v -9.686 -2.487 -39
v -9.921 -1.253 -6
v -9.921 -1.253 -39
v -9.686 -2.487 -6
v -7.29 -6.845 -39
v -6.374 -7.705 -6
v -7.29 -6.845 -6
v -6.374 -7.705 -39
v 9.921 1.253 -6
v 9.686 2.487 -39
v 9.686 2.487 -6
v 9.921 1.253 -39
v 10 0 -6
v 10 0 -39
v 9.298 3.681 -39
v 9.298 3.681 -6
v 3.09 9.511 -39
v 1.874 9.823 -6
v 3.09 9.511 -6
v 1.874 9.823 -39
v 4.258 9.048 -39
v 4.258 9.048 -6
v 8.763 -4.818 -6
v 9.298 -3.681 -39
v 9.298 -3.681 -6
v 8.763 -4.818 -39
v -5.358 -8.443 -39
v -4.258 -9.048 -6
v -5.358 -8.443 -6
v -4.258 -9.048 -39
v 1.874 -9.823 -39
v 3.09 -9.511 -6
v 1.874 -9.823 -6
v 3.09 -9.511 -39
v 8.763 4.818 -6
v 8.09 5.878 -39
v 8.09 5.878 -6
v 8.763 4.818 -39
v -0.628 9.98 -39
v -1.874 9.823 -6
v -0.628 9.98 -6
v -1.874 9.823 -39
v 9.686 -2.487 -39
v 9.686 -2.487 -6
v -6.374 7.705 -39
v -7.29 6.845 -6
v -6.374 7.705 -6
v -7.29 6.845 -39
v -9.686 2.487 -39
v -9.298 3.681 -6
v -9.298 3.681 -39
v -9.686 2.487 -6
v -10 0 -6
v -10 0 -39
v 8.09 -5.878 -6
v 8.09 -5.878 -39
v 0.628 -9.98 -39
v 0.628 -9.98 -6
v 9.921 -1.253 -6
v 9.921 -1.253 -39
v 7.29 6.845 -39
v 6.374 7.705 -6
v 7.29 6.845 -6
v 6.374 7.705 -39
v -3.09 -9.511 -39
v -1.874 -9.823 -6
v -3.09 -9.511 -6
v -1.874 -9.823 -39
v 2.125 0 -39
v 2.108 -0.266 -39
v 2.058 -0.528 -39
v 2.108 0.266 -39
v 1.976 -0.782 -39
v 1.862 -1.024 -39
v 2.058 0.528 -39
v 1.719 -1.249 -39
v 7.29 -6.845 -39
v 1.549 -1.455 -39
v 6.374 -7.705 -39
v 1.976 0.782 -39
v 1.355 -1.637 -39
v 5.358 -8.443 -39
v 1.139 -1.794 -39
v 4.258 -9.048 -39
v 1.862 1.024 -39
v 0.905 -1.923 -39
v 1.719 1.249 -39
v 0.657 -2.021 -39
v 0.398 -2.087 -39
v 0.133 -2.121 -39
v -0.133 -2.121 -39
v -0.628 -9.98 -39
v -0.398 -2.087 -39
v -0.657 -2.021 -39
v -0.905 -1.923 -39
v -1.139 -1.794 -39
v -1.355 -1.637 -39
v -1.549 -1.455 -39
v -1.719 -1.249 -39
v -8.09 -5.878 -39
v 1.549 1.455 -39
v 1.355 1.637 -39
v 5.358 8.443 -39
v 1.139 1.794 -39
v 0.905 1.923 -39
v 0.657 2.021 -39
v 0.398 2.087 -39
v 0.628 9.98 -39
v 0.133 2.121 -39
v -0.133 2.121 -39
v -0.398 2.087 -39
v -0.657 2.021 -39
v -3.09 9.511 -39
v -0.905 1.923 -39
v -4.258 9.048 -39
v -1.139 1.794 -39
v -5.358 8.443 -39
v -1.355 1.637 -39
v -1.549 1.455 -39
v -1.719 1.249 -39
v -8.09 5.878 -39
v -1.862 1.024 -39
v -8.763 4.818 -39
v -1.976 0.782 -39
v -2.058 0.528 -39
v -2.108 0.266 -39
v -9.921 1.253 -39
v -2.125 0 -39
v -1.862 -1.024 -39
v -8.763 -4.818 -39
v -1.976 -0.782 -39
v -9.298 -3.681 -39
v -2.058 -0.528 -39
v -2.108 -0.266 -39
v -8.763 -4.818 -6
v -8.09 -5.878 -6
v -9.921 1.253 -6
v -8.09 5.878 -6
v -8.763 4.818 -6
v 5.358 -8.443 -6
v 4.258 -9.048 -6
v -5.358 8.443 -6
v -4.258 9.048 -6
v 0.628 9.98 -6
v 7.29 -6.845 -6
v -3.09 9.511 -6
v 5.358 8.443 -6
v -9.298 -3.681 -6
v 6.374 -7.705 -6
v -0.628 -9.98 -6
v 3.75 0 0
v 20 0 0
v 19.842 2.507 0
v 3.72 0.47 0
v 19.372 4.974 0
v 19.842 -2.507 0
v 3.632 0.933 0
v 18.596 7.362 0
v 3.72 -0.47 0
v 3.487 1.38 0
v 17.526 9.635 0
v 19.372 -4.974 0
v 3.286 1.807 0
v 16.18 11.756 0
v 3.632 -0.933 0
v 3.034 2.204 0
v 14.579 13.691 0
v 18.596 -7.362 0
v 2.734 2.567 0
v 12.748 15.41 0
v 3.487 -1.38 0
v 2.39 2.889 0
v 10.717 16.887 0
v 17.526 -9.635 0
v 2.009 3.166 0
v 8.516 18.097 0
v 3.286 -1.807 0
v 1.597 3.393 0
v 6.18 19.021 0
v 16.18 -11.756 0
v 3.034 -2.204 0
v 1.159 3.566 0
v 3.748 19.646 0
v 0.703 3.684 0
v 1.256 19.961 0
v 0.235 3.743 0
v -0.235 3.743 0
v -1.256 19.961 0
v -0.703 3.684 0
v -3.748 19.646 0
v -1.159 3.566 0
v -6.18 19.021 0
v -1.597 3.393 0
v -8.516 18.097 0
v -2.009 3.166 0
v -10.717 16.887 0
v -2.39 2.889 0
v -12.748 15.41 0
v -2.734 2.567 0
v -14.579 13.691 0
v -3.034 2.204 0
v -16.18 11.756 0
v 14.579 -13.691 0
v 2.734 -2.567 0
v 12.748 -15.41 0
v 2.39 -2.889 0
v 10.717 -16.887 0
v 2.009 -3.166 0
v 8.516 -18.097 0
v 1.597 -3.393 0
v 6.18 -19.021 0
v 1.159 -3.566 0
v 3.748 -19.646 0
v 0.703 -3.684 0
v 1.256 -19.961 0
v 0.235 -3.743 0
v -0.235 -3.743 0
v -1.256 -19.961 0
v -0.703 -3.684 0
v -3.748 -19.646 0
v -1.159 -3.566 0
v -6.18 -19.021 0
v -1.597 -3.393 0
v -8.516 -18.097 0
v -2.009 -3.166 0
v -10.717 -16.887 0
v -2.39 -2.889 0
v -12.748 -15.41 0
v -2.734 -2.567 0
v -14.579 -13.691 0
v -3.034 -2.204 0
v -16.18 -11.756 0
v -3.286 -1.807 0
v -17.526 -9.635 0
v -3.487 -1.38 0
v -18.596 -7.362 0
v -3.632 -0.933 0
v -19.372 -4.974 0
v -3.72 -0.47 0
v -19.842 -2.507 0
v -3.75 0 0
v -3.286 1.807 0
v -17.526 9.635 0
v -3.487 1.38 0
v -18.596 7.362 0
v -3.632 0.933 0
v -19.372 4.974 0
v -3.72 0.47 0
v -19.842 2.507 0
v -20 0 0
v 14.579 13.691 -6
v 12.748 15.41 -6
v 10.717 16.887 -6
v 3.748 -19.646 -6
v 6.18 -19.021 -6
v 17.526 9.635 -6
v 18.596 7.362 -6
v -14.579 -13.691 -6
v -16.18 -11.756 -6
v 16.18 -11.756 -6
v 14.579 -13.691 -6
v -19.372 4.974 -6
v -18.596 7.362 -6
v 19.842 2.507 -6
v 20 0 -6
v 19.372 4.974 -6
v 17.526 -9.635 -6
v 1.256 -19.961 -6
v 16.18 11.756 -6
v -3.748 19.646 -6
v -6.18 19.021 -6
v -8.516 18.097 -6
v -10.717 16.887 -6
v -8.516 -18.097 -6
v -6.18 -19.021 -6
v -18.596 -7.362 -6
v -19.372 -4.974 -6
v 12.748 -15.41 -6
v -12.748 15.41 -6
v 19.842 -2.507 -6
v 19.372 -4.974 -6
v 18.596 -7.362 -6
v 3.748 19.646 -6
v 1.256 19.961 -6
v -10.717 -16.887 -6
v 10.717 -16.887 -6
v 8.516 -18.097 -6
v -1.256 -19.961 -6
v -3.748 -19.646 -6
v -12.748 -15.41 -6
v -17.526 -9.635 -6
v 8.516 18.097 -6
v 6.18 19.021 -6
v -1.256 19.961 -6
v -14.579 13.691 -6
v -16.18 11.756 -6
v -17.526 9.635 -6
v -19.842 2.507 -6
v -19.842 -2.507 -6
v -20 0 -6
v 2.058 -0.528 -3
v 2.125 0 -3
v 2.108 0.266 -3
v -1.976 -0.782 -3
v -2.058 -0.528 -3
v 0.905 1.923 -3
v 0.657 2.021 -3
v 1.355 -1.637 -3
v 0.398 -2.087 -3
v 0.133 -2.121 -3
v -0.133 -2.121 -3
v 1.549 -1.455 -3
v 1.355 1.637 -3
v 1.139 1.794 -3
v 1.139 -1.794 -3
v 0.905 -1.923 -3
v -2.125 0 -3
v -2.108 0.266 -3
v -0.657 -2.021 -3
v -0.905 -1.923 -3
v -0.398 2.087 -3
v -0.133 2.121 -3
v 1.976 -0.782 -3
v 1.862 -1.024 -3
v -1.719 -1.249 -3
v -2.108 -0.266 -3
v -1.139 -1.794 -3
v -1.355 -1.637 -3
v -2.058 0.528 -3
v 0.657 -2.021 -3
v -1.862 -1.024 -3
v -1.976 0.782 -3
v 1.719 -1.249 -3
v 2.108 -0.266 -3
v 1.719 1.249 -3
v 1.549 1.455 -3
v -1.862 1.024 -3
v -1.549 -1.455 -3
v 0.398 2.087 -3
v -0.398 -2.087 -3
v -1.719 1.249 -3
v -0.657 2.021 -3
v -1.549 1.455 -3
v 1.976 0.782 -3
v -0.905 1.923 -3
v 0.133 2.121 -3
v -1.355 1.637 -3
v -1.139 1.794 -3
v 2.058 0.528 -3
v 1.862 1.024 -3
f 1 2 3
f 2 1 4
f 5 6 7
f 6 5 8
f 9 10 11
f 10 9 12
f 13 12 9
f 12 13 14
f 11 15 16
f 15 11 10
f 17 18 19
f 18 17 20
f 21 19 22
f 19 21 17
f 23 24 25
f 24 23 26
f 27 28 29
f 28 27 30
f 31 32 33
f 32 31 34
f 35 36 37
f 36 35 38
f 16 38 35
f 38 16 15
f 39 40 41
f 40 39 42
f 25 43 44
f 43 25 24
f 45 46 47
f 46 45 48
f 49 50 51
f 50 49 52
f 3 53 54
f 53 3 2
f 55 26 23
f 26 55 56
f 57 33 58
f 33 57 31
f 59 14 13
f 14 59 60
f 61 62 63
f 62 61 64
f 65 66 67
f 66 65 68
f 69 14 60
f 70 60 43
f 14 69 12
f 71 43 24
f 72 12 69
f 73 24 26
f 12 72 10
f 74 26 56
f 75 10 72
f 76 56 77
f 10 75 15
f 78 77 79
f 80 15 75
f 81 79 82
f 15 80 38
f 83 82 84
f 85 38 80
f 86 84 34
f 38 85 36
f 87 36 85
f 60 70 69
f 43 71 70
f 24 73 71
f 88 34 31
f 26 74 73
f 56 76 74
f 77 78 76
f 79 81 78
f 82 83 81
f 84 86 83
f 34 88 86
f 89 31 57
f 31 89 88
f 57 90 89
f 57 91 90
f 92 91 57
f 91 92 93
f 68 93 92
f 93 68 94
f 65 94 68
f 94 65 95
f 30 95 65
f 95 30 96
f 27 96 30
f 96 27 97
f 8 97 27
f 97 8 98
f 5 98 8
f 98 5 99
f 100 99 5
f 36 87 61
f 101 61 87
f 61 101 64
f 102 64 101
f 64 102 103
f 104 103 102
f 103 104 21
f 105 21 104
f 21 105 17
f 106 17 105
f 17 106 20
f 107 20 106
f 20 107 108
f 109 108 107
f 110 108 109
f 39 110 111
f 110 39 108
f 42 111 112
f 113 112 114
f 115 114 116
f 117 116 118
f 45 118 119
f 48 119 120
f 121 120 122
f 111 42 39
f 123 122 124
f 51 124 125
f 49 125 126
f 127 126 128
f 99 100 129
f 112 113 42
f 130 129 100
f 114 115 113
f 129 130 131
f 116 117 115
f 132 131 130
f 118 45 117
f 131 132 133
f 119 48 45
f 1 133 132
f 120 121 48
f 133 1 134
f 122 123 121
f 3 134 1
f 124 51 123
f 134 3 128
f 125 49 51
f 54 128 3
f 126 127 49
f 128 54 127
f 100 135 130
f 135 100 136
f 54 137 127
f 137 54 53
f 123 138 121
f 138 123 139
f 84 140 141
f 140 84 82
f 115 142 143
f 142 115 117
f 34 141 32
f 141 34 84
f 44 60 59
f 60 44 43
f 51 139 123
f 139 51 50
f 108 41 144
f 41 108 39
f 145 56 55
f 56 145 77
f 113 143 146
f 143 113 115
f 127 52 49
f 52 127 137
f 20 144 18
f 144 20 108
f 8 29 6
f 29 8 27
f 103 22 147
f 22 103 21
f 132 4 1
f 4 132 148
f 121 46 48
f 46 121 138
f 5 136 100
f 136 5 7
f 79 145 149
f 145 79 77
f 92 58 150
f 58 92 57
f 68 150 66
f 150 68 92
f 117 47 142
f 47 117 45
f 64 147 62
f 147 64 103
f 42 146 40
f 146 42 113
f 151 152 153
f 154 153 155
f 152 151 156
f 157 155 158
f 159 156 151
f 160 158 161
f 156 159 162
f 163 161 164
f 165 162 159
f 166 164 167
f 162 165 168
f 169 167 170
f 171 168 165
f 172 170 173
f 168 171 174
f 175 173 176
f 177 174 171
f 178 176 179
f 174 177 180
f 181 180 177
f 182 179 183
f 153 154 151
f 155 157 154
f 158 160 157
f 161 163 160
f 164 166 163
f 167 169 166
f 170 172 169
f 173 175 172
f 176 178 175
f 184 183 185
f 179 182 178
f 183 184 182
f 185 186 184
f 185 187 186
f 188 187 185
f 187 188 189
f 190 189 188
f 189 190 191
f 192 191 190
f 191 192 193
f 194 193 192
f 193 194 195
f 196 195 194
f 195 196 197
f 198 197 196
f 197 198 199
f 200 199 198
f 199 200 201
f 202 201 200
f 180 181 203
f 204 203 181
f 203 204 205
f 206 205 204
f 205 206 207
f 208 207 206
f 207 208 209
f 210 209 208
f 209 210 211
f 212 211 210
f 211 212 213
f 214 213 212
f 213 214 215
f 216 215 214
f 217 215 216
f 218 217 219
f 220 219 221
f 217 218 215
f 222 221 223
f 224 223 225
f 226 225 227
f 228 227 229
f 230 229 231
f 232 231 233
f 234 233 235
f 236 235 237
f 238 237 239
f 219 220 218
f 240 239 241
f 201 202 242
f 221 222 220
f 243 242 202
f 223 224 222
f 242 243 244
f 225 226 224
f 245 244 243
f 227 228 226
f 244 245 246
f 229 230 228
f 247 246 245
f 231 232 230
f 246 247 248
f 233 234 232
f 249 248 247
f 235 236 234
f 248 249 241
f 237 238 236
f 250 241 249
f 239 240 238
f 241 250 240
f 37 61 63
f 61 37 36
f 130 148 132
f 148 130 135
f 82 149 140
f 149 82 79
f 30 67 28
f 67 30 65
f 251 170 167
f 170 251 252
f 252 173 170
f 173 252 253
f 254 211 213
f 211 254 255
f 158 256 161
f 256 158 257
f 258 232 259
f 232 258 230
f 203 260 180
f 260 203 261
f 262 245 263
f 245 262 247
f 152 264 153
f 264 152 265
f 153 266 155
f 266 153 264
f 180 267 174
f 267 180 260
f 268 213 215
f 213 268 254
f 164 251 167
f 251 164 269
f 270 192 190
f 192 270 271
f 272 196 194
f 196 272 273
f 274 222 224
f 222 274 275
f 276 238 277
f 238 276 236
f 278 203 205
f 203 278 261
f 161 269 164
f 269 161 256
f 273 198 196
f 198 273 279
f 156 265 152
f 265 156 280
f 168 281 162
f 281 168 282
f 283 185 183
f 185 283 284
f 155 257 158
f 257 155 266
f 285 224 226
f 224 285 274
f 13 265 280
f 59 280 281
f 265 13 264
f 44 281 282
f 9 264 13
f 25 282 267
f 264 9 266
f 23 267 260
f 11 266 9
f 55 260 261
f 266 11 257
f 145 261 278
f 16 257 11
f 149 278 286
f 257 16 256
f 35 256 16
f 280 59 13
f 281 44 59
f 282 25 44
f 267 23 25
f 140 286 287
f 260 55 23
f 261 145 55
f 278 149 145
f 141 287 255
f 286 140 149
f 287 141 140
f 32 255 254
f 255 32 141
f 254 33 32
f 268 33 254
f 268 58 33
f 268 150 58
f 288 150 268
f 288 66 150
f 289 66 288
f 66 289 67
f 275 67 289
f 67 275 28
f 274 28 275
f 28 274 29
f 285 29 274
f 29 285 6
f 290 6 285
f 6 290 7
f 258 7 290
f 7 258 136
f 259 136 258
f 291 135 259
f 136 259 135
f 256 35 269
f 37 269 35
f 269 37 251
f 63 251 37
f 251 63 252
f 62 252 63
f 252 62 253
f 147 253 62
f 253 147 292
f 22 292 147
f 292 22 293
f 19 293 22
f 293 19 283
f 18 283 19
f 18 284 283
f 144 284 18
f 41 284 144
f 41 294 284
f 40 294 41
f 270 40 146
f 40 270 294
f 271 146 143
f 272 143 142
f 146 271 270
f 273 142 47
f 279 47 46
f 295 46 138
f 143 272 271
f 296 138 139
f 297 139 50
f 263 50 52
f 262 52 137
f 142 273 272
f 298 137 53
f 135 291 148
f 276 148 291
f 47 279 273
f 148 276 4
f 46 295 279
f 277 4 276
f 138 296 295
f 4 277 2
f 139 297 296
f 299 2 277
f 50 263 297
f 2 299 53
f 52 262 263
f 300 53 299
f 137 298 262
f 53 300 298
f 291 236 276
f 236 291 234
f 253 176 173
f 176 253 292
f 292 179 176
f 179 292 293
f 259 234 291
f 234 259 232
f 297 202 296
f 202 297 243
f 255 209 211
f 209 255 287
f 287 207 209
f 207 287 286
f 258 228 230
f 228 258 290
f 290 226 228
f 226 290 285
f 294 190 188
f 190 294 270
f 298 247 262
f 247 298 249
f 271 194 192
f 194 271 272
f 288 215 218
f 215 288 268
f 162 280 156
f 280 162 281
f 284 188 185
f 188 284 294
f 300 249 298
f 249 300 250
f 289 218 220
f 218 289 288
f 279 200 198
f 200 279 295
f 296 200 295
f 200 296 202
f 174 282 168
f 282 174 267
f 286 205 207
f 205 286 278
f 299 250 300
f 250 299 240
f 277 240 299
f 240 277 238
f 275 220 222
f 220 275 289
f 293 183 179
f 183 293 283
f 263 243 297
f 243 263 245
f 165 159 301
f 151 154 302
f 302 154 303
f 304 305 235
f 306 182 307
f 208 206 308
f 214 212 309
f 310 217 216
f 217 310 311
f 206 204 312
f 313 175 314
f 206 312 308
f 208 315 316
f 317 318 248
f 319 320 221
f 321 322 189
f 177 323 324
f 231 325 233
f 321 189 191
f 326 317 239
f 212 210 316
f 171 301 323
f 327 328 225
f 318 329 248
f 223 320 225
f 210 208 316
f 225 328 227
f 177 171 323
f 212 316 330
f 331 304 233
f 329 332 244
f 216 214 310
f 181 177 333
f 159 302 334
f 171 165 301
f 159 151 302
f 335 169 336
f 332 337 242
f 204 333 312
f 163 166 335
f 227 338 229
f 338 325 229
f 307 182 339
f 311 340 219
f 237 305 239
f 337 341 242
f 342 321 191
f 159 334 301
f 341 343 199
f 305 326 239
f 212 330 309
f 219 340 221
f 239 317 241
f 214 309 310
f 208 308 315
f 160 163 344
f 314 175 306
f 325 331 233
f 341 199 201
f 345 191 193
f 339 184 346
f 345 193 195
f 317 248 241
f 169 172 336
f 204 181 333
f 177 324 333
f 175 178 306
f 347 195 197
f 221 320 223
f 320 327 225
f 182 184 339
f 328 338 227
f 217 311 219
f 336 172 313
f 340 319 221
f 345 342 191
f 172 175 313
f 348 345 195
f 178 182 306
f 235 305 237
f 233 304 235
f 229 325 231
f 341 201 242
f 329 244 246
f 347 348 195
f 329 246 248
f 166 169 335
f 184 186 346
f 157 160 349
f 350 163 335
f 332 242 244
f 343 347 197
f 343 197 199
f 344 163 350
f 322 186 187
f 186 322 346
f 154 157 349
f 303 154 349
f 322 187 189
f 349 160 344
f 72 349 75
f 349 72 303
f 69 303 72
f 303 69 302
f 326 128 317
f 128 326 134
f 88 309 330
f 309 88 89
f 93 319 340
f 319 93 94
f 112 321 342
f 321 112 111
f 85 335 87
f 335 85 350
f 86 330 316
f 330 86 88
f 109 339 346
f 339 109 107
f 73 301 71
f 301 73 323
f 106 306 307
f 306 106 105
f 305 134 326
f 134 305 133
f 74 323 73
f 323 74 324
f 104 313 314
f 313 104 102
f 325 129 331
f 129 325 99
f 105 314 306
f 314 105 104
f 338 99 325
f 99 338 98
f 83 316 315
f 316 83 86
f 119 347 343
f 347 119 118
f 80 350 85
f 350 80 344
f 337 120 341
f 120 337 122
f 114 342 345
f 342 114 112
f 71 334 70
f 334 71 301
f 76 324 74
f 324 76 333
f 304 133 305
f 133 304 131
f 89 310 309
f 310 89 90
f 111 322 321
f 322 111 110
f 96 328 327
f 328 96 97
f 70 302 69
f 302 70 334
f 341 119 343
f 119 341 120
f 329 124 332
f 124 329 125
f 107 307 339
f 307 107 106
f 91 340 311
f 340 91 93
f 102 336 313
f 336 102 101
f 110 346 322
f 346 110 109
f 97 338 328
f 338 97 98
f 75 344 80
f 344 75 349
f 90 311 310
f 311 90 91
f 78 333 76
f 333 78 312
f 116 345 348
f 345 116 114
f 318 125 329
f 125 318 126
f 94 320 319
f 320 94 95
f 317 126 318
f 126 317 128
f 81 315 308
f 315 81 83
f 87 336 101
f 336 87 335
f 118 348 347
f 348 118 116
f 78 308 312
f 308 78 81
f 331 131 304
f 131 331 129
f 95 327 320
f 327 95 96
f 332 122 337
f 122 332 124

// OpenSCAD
$fn = 50;


difference() {
	union() {
		translate(v = [0, 0, -39.0000000000]) {
			cylinder(h = 39, r = 10.0000000000);
		}
		translate(v = [0, 0, -6.0000000000]) {
			cylinder(h = 6, r = 20.0000000000);
		}
	}
	union() {
		translate(v = [0, 0, 0]) {
			rotate(a = [0, 0, 0]) {
				difference() {
					union() {
						#translate(v = [0, 0, -39.0000000000]) {
							cylinder(h = 39, r = 2.0000000000);
						}
						#translate(v = [0, 0, -3]) {
							cylinder(h = 3, r = 10.0000000000, r1 = 2.1250000000, r2 = 3.7500000000);
						}
						#translate(v = [0, 0, -39.0000000000]) {
							cylinder(h = 39, r = 2.1250000000);
						}
						#translate(v = [0, 0, -39.0000000000]) {
							cylinder(h = 39, r = 2.0000000000);
						}
					}
					union();
				}
			}
		}
	}
}
